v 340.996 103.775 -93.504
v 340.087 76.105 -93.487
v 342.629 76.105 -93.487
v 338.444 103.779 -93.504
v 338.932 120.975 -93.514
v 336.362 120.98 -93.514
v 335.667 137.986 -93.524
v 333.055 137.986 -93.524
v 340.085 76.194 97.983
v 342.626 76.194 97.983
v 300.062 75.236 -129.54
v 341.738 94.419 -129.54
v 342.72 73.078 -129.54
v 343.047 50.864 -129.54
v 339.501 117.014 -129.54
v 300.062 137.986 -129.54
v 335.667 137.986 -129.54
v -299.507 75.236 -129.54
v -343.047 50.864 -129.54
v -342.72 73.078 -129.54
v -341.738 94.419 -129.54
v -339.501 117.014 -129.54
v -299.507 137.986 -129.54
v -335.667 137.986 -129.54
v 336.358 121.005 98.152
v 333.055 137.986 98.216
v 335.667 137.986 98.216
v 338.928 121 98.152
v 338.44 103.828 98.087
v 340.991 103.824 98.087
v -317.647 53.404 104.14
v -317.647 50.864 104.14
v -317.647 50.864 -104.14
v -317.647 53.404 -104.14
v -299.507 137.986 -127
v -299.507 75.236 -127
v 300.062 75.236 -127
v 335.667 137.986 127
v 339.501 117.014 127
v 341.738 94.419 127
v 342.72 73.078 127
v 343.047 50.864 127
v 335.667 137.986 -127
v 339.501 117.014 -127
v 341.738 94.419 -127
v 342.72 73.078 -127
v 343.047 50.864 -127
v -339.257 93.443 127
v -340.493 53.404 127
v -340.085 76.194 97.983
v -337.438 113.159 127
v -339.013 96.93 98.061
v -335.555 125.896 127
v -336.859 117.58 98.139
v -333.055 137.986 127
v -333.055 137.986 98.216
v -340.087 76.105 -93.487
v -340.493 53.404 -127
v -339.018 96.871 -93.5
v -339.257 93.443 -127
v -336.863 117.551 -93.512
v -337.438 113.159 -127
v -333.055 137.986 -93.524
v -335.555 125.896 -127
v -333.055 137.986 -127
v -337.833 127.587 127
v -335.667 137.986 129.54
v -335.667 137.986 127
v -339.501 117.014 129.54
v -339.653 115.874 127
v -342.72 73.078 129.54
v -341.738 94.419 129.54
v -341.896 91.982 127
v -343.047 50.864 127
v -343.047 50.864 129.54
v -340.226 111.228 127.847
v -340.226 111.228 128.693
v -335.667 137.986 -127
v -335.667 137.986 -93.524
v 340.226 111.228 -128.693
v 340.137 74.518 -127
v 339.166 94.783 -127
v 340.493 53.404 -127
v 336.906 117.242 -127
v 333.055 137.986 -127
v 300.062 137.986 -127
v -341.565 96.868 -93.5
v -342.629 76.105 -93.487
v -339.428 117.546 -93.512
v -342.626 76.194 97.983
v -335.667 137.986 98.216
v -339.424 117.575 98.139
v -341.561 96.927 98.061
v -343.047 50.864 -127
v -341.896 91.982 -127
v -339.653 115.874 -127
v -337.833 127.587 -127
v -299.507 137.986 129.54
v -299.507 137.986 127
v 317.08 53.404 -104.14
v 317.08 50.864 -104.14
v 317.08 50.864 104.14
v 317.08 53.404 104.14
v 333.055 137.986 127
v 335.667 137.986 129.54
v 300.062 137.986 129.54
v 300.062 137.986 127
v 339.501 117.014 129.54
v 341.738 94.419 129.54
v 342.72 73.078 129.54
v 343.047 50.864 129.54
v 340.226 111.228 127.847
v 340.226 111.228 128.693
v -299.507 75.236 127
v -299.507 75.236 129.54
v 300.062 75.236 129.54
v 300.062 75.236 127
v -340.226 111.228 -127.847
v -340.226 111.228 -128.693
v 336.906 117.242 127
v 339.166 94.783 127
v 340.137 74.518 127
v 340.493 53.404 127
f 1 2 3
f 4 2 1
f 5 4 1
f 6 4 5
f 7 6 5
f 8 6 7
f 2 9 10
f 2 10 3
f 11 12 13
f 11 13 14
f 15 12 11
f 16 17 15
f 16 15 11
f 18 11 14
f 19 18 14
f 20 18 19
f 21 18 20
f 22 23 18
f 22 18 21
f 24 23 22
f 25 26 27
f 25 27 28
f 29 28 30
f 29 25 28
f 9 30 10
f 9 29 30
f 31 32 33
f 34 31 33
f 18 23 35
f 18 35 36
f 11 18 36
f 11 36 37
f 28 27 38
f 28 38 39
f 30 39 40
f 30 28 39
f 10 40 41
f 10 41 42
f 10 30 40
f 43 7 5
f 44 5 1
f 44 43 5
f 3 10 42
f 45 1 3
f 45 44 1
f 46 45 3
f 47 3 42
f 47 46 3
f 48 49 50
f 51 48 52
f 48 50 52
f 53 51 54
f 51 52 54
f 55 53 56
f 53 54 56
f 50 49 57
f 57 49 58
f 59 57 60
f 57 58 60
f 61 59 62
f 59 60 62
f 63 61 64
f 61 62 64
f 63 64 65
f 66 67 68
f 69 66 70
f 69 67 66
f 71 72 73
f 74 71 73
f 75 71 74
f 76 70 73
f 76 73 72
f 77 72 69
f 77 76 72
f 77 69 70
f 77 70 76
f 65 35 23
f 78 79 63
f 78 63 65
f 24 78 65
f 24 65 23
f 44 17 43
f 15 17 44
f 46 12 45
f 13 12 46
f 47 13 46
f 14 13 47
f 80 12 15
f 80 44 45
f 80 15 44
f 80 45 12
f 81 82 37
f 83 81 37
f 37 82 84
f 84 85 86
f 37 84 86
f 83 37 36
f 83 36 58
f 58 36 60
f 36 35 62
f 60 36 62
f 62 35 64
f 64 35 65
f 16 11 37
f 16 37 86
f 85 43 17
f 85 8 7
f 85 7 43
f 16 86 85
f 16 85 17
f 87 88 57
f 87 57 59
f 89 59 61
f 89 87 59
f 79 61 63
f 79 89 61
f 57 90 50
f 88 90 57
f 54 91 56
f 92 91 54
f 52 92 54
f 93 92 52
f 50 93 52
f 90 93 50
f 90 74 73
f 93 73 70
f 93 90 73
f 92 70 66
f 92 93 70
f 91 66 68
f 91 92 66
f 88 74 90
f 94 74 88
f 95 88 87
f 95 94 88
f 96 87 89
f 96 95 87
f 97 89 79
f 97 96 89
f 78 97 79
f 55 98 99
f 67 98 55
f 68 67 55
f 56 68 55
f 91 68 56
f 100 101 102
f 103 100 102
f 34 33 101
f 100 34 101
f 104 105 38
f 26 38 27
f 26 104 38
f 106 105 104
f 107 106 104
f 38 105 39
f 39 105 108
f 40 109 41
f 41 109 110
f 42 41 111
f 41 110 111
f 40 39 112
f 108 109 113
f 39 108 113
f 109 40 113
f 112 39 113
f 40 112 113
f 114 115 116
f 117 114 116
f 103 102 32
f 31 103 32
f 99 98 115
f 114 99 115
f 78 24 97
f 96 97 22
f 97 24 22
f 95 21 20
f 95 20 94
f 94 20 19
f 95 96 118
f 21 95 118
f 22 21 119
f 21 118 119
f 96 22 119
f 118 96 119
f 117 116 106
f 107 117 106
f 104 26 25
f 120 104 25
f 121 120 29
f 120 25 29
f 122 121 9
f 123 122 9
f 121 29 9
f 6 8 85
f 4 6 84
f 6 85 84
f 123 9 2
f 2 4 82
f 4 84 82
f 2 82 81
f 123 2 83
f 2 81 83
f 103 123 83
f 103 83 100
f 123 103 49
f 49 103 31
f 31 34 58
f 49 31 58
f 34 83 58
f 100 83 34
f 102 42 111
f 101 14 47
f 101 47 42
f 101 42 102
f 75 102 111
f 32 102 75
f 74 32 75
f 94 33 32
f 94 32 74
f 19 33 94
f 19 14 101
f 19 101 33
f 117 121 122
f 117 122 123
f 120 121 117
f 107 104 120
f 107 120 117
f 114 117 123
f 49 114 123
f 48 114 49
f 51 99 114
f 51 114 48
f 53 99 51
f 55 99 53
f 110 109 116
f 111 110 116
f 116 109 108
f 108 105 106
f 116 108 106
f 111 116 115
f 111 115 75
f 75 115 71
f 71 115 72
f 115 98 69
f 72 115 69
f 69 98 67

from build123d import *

# Parameters (mm, degrees)
EXTRUDE_THIN2_START    = -127
EXTRUDE_THIN2_DEPTH    = 254
SPLIT1_SURFACE_1_BACK  = 741.713
SPLIT1_SURFACE_1_DEPTH = 1483.426
BOSS_EXTRUDE2_DEPTH    = 2.54
BOSS_EXTRUDE3_DEPTH    = 2.54
SPLIT2_SURFACE_2_BACK  = 743.47
SPLIT2_SURFACE_2_DEPTH = 1486.94
SPLIT3_SURFACE_3_BACK  = 743.47
SPLIT3_SURFACE_3_DEPTH = 1486.94


# Read off the part's stored shape, not the designer's step: Extrude-Thin2
with BuildPart() as part:
    # Extrude-Thin2 outline → Extrude-Thin2 (new body)
    with BuildSketch(Plane.XY.offset(EXTRUDE_THIN2_START)):
        with BuildLine():
            Line((-325.542449195, 166.687822519), (-325.542449195, 166.669160537))
            Line((-325.542449195, 166.669160537), (-325.579794085, 166.687822519))
            add(Edge.make_bspline(
                [(-343.046678298, 50.863822519), (-342.854742326, 95.850869045), (-340.503085509, 136.824505781), (-325.579794085, 166.687822519)],
                knots=[0.396009693, 0.396009693, 0.396009693, 0.396009693, 0.524743478, 0.524743478, 0.524743478, 0.524743478], degree=3))
            Line((-343.046678298, 50.863822519), (343.046678298, 50.863822519))
            add(Edge.make_bspline(
                [(325.579794084, 166.687822519), (340.503085509, 136.824505781), (342.854742326, 95.850869045), (343.046678298, 50.863822519)],
                knots=[0.396009693, 0.396009693, 0.396009693, 0.396009693, 0.524743478, 0.524743478, 0.524743478, 0.524743478], degree=3))
            Line((325.579794084, 166.687822519), (323.307694442, 165.552409283))
            add(Edge.make_bspline(
                [(323.307694442, 165.552409283), (326.877593275, 158.408608594), (329.727019011, 150.576977672), (334.257221566, 133.733582984), (335.93764666, 124.722865717), (339.652297398, 96.250136339), (340.357498858, 75.350575466), (340.493401884, 53.403822519)],
                knots=[0, 0, 0, 0, 0.25, 0.25, 0.5, 0.5, 1, 1, 1, 1], degree=3))
            Line((340.493401884, 53.403822519), (-340.493401884, 53.403822519))
            add(Edge.make_bspline(
                [(-340.493401884, 53.403822519), (-340.357498858, 75.350575466), (-339.652297398, 96.250136339), (-335.937646661, 124.722865717), (-334.257221567, 133.733582984), (-329.727019012, 150.576977672), (-326.877593276, 158.408608594), (-323.307694443, 165.552409283)],
                knots=[0, 0, 0, 0, 0.5, 0.5, 0.75, 0.75, 1, 1, 1, 1], degree=3))
            Line((-323.307694443, 165.552409283), (-325.502746425, 166.649320276))
            Line((-325.502746425, 166.649320276), (-325.502746425, 166.687822519))
            Line((-325.502746425, 166.687822519), (-325.542449195, 166.687822519))
        make_face()
    extrude(amount=EXTRUDE_THIN2_DEPTH)

    # Split1: cut with a surface, the side behind it stays
    # Split1 surface: a surface, the sketch's curves swept straight by 1483.426 mm
    with BuildLine(Plane(origin=(0, 0, 0), x_dir=(0, 0, -1), z_dir=(1, 0, 0)).offset(-SPLIT1_SURFACE_1_BACK), mode=Mode.PRIVATE) as split1_surface_1_path:
        Line((-98.324088945, 166.687822519), (-97.98299712, 76.193733858))
        Line((-97.98299712, 76.193733858), (93.487324748, 76.104761498))
        Line((93.487324748, 76.104761498), (93.541066072, 166.687822519))
        Line((93.541066072, 166.687822519), (-98.324088945, 166.687822519))
    split1_surface_1 = Shell.extrude(split1_surface_1_path.wire(), (1 * SPLIT1_SURFACE_1_DEPTH, 0 * SPLIT1_SURFACE_1_DEPTH, 0 * SPLIT1_SURFACE_1_DEPTH))
    split(bisect_by=split1_surface_1, keep=Keep.BOTTOM)

    # Sketch6 → Boss-Extrude2 (add)
    with BuildSketch(Plane.XY.offset(129.54)):
        with BuildLine():
            Line((343.046678298, 50.863822519), (-343.046678298, 50.863822519))
            add(Edge.make_bspline(
                [(-325.579794085, 166.687822519), (-340.503085509, 136.824505781), (-342.854742326, 95.850869045), (-343.046678298, 50.863822519)],
                knots=[0.396009693, 0.396009693, 0.396009693, 0.396009693, 0.524743478, 0.524743478, 0.524743478, 0.524743478], degree=3))
            Line((-325.579794085, 166.687822519), (-325.542449195, 166.687822519))
            Line((-325.542449195, 166.687822519), (-299.506767133, 166.687822519))
            Line((-299.506767133, 166.687822519), (-299.506767133, 75.23611572))
            Line((-299.506767133, 75.23611572), (300.062358087, 75.23611572))
            Line((300.062358087, 75.23611572), (300.062358087, 166.687822519))
            Line((300.062358087, 166.687822519), (325.579794084, 166.687822519))
            add(Edge.make_bspline(
                [(325.579794084, 166.687822519), (340.503085509, 136.824505781), (342.854742326, 95.850869045), (343.046678298, 50.863822519)],
                knots=[0.396009693, 0.396009693, 0.396009693, 0.396009693, 0.524743478, 0.524743478, 0.524743478, 0.524743478], degree=3))
        make_face()
    extrude(amount=-BOSS_EXTRUDE2_DEPTH)

    # Sketch7 → Boss-Extrude3 (add)
    with BuildSketch(Plane(origin=(0, 0, -129.54), x_dir=(-1, 0, 0), z_dir=(0, 0, -1))):
        with BuildLine():
            Line((0, 50.863822519), (0, 75.23611572))
            Line((0, 75.23611572), (-300.062358087, 75.23611572))
            Line((-300.062358087, 75.23611572), (-300.062358087, 166.687822519))
            Line((-300.062358087, 166.687822519), (-325.502746425, 166.687822519))
            Line((-325.502746425, 166.687822519), (-325.542449195, 166.687822519))
            Line((-325.542449195, 166.687822519), (-325.579794085, 166.687822519))
            add(Edge.make_bspline(
                [(-325.579794085, 166.687822519), (-340.503085509, 136.824505781), (-342.854742326, 95.850869045), (-343.046678298, 50.863822519)],
                knots=[0.396009693, 0.396009693, 0.396009693, 0.396009693, 0.524743478, 0.524743478, 0.524743478, 0.524743478], degree=3))
            Line((-343.046678298, 50.863822519), (0, 50.863822519))
        make_face()
        with BuildLine():
            Line((299.506767133, 75.23611572), (0, 75.23611572))
            Line((0, 75.23611572), (0, 50.863822519))
            Line((0, 50.863822519), (343.046678298, 50.863822519))
            add(Edge.make_bspline(
                [(325.579794084, 166.687822519), (340.503085509, 136.824505781), (342.854742326, 95.850869045), (343.046678298, 50.863822519)],
                knots=[0.396009693, 0.396009693, 0.396009693, 0.396009693, 0.524743478, 0.524743478, 0.524743478, 0.524743478], degree=3))
            Line((325.579794084, 166.687822519), (299.506767133, 166.687822519))
            Line((299.506767133, 166.687822519), (299.506767133, 75.23611572))
        make_face()
    extrude(amount=-BOSS_EXTRUDE3_DEPTH)

    # Split2: cut with a surface, the side it looks to stays
    # Split2 surface: a surface, the sketch's curves swept straight by 1486.94 mm
    with BuildLine(Plane(origin=(0, 0, 0), x_dir=(1, 0, 0), z_dir=(0, 1, 0)).offset(-SPLIT2_SURFACE_2_BACK), mode=Mode.PRIVATE) as split2_surface_2_path:
        Line((-317.646678298, 104.14), (317.080123639, 104.14))
        Line((317.080123639, 104.14), (317.080123639, -104.14))
        Line((317.080123639, -104.14), (-317.646678298, -104.14))
        Line((-317.646678298, -104.14), (-317.646678298, 104.14))
    split2_surface_2 = Shell.extrude(split2_surface_2_path.wire(), (0 * SPLIT2_SURFACE_2_DEPTH, 1 * SPLIT2_SURFACE_2_DEPTH, 0 * SPLIT2_SURFACE_2_DEPTH))
    split(bisect_by=split2_surface_2, keep=Keep.TOP)

    # Split3: cut with a surface, the side behind it stays
    # Split3 surface: a surface, the sketch's curves swept straight by 1486.94 mm
    with BuildLine(Plane(origin=(0, 0, 0), x_dir=(0, 0, -1), z_dir=(1, 0, 0)).offset(-SPLIT3_SURFACE_3_BACK), mode=Mode.PRIVATE) as split3_surface_3_path:
        Line((-165.841686169, 137.985822519), (168.310027545, 137.985822519))
    split3_surface_3 = Shell.extrude(split3_surface_3_path.wire(), (1 * SPLIT3_SURFACE_3_DEPTH, 0 * SPLIT3_SURFACE_3_DEPTH, 0 * SPLIT3_SURFACE_3_DEPTH))
    split(bisect_by=split3_surface_3, keep=Keep.BOTTOM)


solid = part.part
